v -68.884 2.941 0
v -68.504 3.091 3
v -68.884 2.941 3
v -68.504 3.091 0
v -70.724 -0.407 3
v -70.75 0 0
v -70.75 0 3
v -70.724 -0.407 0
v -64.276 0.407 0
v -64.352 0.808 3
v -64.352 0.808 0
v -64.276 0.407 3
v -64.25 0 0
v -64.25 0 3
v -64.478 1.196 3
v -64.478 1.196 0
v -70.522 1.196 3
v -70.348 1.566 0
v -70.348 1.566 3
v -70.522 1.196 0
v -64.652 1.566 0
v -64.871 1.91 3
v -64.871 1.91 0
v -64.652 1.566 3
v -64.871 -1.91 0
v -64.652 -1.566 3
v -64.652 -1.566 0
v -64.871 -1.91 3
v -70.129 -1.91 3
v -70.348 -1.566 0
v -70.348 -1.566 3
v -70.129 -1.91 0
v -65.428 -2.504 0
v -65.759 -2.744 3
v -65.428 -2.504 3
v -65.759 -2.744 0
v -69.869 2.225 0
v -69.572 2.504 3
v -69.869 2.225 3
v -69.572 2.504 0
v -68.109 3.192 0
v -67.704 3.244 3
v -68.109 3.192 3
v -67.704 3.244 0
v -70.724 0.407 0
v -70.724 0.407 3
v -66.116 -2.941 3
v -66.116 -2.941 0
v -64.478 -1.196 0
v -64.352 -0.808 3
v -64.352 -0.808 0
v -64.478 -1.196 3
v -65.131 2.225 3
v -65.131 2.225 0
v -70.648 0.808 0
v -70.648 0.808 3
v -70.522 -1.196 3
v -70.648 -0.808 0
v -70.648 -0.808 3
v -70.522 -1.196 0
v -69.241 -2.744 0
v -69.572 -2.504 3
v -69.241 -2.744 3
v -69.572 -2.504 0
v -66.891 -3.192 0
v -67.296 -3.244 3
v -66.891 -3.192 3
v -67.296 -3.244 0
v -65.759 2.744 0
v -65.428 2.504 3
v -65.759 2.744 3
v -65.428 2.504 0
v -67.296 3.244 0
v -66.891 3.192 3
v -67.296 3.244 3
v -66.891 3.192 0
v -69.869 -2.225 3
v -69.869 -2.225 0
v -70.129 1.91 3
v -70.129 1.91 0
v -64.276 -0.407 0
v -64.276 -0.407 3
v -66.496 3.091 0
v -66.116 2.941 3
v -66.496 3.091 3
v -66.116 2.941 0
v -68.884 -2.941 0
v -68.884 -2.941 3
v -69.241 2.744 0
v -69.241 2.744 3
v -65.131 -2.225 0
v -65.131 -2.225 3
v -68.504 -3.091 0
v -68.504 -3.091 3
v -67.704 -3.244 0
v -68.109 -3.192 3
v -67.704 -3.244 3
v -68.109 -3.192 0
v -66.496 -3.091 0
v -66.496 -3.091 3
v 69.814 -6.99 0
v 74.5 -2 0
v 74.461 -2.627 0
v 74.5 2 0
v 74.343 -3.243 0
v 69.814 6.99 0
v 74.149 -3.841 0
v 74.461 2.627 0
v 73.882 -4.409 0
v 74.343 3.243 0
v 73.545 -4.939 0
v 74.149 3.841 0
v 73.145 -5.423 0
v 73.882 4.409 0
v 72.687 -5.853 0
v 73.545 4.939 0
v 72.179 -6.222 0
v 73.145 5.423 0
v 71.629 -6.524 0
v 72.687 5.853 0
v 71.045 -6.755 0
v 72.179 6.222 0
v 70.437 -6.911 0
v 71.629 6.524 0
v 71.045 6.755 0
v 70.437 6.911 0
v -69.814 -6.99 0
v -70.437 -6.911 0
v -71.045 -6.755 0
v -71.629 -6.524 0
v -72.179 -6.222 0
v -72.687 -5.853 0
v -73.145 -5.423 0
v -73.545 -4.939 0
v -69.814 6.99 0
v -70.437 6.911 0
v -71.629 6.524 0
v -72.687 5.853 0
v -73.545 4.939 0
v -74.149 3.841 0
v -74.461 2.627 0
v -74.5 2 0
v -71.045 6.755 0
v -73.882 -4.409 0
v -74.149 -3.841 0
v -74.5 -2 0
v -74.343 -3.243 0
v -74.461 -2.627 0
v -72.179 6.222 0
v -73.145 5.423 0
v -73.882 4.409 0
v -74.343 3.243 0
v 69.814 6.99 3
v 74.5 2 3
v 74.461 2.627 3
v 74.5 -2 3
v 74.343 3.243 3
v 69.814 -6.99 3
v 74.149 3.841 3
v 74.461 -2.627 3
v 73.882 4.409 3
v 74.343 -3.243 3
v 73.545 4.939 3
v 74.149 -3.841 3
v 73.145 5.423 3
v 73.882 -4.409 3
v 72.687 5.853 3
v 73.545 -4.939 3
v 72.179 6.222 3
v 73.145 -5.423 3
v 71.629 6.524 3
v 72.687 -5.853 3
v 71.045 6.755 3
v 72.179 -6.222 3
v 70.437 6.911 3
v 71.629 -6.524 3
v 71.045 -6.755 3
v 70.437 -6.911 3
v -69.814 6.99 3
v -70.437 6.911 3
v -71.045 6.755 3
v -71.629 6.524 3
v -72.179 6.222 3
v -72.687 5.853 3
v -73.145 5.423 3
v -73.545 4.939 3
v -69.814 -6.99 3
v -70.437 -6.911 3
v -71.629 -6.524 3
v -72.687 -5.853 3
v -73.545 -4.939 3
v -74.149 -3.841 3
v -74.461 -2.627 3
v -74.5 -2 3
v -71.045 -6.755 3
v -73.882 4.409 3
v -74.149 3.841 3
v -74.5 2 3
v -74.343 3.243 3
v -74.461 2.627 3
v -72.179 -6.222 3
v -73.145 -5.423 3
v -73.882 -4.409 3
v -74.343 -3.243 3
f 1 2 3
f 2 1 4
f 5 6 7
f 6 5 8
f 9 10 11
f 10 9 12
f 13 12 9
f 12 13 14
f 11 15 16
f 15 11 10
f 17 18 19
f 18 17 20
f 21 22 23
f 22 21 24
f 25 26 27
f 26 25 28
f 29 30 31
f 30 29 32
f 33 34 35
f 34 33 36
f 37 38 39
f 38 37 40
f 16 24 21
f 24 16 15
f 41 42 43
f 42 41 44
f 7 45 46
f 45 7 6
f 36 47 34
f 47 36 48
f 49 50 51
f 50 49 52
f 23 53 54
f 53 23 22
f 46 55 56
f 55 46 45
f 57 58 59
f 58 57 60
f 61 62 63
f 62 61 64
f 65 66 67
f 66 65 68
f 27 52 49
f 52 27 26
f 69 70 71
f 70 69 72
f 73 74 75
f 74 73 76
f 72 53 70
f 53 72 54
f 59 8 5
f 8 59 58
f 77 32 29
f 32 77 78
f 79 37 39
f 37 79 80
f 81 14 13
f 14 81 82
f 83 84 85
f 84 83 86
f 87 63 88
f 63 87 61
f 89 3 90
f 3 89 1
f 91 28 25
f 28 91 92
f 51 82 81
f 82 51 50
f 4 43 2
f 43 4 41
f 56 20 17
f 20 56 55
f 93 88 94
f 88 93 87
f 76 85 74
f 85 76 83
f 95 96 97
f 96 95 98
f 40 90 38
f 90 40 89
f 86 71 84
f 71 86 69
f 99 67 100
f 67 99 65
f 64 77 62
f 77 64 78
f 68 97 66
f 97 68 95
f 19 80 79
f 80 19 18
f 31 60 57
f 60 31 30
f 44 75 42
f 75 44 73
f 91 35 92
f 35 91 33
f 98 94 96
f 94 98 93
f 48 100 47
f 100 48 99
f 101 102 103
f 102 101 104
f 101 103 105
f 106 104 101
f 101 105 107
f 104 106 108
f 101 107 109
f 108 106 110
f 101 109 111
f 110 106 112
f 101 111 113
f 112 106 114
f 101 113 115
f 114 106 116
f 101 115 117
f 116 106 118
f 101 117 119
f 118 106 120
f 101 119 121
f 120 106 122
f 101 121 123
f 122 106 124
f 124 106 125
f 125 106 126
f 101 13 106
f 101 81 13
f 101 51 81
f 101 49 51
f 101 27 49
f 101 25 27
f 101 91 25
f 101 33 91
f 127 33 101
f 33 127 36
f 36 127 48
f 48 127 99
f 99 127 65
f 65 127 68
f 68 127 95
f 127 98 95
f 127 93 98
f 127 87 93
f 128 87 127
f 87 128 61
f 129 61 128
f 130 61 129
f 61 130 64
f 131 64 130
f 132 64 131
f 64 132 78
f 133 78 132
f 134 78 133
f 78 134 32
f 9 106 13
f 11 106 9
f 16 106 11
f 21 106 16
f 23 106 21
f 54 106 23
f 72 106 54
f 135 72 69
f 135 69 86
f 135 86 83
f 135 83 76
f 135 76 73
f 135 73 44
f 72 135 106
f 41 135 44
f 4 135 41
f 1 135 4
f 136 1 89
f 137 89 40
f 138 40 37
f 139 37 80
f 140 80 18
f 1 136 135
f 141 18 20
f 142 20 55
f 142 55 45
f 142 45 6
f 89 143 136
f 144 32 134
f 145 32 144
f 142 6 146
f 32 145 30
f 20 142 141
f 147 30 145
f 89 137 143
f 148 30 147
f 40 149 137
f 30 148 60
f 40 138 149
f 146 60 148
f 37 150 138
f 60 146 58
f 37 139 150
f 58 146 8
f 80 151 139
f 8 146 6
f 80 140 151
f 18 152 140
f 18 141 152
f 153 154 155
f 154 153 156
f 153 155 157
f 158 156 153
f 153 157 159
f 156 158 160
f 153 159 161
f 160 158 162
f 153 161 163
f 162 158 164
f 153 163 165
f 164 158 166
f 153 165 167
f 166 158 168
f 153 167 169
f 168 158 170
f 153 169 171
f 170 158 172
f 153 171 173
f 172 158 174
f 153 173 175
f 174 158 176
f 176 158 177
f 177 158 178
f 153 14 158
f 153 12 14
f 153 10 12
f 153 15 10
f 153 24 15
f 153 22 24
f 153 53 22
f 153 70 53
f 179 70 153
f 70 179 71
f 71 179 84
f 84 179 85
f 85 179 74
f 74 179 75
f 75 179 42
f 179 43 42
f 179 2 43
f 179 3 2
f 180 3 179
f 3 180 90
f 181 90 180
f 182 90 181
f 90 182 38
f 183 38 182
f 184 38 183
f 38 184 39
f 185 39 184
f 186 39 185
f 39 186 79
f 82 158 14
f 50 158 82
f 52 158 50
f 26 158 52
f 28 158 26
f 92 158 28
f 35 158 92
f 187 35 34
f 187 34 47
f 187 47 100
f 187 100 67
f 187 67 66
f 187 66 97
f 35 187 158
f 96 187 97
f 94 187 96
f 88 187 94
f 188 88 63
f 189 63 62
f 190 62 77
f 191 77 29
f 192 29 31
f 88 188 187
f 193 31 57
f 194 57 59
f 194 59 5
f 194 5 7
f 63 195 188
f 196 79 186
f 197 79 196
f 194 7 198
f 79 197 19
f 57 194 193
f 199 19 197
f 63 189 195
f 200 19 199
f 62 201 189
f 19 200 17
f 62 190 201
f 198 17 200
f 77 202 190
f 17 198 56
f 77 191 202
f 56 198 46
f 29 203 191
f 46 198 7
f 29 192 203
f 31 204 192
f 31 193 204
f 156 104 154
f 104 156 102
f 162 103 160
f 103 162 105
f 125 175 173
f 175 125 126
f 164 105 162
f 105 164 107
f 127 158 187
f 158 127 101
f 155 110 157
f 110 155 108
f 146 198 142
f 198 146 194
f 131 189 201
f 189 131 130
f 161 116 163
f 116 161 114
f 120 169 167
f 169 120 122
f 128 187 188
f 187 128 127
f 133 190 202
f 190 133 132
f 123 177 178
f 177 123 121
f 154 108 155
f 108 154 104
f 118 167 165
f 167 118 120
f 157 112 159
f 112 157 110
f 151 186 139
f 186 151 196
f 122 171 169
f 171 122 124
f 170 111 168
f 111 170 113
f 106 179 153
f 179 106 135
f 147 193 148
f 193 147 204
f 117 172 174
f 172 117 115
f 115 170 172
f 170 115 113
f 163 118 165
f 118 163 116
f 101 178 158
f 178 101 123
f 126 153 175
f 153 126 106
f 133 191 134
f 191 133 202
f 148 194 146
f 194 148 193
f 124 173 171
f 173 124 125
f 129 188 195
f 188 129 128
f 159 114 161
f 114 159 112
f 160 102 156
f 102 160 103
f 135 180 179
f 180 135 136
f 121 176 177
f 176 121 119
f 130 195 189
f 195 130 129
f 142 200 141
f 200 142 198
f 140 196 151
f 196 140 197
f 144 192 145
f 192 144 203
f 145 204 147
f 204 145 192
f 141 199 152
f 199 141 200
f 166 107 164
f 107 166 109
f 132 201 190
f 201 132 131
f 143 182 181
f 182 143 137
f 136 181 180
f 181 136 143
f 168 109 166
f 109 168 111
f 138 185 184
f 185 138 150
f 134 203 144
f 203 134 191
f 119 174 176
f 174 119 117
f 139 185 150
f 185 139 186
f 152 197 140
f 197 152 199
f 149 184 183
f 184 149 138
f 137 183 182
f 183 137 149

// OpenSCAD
$fn = 50;


difference() {
	union() {
		hull() {
			translate(v = [-69.5000000000, 2.0000000000, 0]) {
				cylinder(h = 3, r = 5);
			}
			translate(v = [69.5000000000, 2.0000000000, 0]) {
				cylinder(h = 3, r = 5);
			}
			translate(v = [-69.5000000000, -2.0000000000, 0]) {
				cylinder(h = 3, r = 5);
			}
			translate(v = [69.5000000000, -2.0000000000, 0]) {
				cylinder(h = 3, r = 5);
			}
		}
	}
	union() {
		translate(v = [-67.5000000000, 0.0000000000, 0]) {
			cylinder(h = 3, r = 3.2500000000);
		}
		translate(v = [-67.5000000000, 0.0000000000, 0]) {
			cylinder(h = 3, r = 1.8000000000);
		}
		translate(v = [-67.5000000000, 0.0000000000, 0]) {
			cylinder(h = 3, r = 1.8000000000);
		}
		translate(v = [-67.5000000000, 0.0000000000, 0]) {
			cylinder(h = 3, r = 1.8000000000);
		}
	}
}
